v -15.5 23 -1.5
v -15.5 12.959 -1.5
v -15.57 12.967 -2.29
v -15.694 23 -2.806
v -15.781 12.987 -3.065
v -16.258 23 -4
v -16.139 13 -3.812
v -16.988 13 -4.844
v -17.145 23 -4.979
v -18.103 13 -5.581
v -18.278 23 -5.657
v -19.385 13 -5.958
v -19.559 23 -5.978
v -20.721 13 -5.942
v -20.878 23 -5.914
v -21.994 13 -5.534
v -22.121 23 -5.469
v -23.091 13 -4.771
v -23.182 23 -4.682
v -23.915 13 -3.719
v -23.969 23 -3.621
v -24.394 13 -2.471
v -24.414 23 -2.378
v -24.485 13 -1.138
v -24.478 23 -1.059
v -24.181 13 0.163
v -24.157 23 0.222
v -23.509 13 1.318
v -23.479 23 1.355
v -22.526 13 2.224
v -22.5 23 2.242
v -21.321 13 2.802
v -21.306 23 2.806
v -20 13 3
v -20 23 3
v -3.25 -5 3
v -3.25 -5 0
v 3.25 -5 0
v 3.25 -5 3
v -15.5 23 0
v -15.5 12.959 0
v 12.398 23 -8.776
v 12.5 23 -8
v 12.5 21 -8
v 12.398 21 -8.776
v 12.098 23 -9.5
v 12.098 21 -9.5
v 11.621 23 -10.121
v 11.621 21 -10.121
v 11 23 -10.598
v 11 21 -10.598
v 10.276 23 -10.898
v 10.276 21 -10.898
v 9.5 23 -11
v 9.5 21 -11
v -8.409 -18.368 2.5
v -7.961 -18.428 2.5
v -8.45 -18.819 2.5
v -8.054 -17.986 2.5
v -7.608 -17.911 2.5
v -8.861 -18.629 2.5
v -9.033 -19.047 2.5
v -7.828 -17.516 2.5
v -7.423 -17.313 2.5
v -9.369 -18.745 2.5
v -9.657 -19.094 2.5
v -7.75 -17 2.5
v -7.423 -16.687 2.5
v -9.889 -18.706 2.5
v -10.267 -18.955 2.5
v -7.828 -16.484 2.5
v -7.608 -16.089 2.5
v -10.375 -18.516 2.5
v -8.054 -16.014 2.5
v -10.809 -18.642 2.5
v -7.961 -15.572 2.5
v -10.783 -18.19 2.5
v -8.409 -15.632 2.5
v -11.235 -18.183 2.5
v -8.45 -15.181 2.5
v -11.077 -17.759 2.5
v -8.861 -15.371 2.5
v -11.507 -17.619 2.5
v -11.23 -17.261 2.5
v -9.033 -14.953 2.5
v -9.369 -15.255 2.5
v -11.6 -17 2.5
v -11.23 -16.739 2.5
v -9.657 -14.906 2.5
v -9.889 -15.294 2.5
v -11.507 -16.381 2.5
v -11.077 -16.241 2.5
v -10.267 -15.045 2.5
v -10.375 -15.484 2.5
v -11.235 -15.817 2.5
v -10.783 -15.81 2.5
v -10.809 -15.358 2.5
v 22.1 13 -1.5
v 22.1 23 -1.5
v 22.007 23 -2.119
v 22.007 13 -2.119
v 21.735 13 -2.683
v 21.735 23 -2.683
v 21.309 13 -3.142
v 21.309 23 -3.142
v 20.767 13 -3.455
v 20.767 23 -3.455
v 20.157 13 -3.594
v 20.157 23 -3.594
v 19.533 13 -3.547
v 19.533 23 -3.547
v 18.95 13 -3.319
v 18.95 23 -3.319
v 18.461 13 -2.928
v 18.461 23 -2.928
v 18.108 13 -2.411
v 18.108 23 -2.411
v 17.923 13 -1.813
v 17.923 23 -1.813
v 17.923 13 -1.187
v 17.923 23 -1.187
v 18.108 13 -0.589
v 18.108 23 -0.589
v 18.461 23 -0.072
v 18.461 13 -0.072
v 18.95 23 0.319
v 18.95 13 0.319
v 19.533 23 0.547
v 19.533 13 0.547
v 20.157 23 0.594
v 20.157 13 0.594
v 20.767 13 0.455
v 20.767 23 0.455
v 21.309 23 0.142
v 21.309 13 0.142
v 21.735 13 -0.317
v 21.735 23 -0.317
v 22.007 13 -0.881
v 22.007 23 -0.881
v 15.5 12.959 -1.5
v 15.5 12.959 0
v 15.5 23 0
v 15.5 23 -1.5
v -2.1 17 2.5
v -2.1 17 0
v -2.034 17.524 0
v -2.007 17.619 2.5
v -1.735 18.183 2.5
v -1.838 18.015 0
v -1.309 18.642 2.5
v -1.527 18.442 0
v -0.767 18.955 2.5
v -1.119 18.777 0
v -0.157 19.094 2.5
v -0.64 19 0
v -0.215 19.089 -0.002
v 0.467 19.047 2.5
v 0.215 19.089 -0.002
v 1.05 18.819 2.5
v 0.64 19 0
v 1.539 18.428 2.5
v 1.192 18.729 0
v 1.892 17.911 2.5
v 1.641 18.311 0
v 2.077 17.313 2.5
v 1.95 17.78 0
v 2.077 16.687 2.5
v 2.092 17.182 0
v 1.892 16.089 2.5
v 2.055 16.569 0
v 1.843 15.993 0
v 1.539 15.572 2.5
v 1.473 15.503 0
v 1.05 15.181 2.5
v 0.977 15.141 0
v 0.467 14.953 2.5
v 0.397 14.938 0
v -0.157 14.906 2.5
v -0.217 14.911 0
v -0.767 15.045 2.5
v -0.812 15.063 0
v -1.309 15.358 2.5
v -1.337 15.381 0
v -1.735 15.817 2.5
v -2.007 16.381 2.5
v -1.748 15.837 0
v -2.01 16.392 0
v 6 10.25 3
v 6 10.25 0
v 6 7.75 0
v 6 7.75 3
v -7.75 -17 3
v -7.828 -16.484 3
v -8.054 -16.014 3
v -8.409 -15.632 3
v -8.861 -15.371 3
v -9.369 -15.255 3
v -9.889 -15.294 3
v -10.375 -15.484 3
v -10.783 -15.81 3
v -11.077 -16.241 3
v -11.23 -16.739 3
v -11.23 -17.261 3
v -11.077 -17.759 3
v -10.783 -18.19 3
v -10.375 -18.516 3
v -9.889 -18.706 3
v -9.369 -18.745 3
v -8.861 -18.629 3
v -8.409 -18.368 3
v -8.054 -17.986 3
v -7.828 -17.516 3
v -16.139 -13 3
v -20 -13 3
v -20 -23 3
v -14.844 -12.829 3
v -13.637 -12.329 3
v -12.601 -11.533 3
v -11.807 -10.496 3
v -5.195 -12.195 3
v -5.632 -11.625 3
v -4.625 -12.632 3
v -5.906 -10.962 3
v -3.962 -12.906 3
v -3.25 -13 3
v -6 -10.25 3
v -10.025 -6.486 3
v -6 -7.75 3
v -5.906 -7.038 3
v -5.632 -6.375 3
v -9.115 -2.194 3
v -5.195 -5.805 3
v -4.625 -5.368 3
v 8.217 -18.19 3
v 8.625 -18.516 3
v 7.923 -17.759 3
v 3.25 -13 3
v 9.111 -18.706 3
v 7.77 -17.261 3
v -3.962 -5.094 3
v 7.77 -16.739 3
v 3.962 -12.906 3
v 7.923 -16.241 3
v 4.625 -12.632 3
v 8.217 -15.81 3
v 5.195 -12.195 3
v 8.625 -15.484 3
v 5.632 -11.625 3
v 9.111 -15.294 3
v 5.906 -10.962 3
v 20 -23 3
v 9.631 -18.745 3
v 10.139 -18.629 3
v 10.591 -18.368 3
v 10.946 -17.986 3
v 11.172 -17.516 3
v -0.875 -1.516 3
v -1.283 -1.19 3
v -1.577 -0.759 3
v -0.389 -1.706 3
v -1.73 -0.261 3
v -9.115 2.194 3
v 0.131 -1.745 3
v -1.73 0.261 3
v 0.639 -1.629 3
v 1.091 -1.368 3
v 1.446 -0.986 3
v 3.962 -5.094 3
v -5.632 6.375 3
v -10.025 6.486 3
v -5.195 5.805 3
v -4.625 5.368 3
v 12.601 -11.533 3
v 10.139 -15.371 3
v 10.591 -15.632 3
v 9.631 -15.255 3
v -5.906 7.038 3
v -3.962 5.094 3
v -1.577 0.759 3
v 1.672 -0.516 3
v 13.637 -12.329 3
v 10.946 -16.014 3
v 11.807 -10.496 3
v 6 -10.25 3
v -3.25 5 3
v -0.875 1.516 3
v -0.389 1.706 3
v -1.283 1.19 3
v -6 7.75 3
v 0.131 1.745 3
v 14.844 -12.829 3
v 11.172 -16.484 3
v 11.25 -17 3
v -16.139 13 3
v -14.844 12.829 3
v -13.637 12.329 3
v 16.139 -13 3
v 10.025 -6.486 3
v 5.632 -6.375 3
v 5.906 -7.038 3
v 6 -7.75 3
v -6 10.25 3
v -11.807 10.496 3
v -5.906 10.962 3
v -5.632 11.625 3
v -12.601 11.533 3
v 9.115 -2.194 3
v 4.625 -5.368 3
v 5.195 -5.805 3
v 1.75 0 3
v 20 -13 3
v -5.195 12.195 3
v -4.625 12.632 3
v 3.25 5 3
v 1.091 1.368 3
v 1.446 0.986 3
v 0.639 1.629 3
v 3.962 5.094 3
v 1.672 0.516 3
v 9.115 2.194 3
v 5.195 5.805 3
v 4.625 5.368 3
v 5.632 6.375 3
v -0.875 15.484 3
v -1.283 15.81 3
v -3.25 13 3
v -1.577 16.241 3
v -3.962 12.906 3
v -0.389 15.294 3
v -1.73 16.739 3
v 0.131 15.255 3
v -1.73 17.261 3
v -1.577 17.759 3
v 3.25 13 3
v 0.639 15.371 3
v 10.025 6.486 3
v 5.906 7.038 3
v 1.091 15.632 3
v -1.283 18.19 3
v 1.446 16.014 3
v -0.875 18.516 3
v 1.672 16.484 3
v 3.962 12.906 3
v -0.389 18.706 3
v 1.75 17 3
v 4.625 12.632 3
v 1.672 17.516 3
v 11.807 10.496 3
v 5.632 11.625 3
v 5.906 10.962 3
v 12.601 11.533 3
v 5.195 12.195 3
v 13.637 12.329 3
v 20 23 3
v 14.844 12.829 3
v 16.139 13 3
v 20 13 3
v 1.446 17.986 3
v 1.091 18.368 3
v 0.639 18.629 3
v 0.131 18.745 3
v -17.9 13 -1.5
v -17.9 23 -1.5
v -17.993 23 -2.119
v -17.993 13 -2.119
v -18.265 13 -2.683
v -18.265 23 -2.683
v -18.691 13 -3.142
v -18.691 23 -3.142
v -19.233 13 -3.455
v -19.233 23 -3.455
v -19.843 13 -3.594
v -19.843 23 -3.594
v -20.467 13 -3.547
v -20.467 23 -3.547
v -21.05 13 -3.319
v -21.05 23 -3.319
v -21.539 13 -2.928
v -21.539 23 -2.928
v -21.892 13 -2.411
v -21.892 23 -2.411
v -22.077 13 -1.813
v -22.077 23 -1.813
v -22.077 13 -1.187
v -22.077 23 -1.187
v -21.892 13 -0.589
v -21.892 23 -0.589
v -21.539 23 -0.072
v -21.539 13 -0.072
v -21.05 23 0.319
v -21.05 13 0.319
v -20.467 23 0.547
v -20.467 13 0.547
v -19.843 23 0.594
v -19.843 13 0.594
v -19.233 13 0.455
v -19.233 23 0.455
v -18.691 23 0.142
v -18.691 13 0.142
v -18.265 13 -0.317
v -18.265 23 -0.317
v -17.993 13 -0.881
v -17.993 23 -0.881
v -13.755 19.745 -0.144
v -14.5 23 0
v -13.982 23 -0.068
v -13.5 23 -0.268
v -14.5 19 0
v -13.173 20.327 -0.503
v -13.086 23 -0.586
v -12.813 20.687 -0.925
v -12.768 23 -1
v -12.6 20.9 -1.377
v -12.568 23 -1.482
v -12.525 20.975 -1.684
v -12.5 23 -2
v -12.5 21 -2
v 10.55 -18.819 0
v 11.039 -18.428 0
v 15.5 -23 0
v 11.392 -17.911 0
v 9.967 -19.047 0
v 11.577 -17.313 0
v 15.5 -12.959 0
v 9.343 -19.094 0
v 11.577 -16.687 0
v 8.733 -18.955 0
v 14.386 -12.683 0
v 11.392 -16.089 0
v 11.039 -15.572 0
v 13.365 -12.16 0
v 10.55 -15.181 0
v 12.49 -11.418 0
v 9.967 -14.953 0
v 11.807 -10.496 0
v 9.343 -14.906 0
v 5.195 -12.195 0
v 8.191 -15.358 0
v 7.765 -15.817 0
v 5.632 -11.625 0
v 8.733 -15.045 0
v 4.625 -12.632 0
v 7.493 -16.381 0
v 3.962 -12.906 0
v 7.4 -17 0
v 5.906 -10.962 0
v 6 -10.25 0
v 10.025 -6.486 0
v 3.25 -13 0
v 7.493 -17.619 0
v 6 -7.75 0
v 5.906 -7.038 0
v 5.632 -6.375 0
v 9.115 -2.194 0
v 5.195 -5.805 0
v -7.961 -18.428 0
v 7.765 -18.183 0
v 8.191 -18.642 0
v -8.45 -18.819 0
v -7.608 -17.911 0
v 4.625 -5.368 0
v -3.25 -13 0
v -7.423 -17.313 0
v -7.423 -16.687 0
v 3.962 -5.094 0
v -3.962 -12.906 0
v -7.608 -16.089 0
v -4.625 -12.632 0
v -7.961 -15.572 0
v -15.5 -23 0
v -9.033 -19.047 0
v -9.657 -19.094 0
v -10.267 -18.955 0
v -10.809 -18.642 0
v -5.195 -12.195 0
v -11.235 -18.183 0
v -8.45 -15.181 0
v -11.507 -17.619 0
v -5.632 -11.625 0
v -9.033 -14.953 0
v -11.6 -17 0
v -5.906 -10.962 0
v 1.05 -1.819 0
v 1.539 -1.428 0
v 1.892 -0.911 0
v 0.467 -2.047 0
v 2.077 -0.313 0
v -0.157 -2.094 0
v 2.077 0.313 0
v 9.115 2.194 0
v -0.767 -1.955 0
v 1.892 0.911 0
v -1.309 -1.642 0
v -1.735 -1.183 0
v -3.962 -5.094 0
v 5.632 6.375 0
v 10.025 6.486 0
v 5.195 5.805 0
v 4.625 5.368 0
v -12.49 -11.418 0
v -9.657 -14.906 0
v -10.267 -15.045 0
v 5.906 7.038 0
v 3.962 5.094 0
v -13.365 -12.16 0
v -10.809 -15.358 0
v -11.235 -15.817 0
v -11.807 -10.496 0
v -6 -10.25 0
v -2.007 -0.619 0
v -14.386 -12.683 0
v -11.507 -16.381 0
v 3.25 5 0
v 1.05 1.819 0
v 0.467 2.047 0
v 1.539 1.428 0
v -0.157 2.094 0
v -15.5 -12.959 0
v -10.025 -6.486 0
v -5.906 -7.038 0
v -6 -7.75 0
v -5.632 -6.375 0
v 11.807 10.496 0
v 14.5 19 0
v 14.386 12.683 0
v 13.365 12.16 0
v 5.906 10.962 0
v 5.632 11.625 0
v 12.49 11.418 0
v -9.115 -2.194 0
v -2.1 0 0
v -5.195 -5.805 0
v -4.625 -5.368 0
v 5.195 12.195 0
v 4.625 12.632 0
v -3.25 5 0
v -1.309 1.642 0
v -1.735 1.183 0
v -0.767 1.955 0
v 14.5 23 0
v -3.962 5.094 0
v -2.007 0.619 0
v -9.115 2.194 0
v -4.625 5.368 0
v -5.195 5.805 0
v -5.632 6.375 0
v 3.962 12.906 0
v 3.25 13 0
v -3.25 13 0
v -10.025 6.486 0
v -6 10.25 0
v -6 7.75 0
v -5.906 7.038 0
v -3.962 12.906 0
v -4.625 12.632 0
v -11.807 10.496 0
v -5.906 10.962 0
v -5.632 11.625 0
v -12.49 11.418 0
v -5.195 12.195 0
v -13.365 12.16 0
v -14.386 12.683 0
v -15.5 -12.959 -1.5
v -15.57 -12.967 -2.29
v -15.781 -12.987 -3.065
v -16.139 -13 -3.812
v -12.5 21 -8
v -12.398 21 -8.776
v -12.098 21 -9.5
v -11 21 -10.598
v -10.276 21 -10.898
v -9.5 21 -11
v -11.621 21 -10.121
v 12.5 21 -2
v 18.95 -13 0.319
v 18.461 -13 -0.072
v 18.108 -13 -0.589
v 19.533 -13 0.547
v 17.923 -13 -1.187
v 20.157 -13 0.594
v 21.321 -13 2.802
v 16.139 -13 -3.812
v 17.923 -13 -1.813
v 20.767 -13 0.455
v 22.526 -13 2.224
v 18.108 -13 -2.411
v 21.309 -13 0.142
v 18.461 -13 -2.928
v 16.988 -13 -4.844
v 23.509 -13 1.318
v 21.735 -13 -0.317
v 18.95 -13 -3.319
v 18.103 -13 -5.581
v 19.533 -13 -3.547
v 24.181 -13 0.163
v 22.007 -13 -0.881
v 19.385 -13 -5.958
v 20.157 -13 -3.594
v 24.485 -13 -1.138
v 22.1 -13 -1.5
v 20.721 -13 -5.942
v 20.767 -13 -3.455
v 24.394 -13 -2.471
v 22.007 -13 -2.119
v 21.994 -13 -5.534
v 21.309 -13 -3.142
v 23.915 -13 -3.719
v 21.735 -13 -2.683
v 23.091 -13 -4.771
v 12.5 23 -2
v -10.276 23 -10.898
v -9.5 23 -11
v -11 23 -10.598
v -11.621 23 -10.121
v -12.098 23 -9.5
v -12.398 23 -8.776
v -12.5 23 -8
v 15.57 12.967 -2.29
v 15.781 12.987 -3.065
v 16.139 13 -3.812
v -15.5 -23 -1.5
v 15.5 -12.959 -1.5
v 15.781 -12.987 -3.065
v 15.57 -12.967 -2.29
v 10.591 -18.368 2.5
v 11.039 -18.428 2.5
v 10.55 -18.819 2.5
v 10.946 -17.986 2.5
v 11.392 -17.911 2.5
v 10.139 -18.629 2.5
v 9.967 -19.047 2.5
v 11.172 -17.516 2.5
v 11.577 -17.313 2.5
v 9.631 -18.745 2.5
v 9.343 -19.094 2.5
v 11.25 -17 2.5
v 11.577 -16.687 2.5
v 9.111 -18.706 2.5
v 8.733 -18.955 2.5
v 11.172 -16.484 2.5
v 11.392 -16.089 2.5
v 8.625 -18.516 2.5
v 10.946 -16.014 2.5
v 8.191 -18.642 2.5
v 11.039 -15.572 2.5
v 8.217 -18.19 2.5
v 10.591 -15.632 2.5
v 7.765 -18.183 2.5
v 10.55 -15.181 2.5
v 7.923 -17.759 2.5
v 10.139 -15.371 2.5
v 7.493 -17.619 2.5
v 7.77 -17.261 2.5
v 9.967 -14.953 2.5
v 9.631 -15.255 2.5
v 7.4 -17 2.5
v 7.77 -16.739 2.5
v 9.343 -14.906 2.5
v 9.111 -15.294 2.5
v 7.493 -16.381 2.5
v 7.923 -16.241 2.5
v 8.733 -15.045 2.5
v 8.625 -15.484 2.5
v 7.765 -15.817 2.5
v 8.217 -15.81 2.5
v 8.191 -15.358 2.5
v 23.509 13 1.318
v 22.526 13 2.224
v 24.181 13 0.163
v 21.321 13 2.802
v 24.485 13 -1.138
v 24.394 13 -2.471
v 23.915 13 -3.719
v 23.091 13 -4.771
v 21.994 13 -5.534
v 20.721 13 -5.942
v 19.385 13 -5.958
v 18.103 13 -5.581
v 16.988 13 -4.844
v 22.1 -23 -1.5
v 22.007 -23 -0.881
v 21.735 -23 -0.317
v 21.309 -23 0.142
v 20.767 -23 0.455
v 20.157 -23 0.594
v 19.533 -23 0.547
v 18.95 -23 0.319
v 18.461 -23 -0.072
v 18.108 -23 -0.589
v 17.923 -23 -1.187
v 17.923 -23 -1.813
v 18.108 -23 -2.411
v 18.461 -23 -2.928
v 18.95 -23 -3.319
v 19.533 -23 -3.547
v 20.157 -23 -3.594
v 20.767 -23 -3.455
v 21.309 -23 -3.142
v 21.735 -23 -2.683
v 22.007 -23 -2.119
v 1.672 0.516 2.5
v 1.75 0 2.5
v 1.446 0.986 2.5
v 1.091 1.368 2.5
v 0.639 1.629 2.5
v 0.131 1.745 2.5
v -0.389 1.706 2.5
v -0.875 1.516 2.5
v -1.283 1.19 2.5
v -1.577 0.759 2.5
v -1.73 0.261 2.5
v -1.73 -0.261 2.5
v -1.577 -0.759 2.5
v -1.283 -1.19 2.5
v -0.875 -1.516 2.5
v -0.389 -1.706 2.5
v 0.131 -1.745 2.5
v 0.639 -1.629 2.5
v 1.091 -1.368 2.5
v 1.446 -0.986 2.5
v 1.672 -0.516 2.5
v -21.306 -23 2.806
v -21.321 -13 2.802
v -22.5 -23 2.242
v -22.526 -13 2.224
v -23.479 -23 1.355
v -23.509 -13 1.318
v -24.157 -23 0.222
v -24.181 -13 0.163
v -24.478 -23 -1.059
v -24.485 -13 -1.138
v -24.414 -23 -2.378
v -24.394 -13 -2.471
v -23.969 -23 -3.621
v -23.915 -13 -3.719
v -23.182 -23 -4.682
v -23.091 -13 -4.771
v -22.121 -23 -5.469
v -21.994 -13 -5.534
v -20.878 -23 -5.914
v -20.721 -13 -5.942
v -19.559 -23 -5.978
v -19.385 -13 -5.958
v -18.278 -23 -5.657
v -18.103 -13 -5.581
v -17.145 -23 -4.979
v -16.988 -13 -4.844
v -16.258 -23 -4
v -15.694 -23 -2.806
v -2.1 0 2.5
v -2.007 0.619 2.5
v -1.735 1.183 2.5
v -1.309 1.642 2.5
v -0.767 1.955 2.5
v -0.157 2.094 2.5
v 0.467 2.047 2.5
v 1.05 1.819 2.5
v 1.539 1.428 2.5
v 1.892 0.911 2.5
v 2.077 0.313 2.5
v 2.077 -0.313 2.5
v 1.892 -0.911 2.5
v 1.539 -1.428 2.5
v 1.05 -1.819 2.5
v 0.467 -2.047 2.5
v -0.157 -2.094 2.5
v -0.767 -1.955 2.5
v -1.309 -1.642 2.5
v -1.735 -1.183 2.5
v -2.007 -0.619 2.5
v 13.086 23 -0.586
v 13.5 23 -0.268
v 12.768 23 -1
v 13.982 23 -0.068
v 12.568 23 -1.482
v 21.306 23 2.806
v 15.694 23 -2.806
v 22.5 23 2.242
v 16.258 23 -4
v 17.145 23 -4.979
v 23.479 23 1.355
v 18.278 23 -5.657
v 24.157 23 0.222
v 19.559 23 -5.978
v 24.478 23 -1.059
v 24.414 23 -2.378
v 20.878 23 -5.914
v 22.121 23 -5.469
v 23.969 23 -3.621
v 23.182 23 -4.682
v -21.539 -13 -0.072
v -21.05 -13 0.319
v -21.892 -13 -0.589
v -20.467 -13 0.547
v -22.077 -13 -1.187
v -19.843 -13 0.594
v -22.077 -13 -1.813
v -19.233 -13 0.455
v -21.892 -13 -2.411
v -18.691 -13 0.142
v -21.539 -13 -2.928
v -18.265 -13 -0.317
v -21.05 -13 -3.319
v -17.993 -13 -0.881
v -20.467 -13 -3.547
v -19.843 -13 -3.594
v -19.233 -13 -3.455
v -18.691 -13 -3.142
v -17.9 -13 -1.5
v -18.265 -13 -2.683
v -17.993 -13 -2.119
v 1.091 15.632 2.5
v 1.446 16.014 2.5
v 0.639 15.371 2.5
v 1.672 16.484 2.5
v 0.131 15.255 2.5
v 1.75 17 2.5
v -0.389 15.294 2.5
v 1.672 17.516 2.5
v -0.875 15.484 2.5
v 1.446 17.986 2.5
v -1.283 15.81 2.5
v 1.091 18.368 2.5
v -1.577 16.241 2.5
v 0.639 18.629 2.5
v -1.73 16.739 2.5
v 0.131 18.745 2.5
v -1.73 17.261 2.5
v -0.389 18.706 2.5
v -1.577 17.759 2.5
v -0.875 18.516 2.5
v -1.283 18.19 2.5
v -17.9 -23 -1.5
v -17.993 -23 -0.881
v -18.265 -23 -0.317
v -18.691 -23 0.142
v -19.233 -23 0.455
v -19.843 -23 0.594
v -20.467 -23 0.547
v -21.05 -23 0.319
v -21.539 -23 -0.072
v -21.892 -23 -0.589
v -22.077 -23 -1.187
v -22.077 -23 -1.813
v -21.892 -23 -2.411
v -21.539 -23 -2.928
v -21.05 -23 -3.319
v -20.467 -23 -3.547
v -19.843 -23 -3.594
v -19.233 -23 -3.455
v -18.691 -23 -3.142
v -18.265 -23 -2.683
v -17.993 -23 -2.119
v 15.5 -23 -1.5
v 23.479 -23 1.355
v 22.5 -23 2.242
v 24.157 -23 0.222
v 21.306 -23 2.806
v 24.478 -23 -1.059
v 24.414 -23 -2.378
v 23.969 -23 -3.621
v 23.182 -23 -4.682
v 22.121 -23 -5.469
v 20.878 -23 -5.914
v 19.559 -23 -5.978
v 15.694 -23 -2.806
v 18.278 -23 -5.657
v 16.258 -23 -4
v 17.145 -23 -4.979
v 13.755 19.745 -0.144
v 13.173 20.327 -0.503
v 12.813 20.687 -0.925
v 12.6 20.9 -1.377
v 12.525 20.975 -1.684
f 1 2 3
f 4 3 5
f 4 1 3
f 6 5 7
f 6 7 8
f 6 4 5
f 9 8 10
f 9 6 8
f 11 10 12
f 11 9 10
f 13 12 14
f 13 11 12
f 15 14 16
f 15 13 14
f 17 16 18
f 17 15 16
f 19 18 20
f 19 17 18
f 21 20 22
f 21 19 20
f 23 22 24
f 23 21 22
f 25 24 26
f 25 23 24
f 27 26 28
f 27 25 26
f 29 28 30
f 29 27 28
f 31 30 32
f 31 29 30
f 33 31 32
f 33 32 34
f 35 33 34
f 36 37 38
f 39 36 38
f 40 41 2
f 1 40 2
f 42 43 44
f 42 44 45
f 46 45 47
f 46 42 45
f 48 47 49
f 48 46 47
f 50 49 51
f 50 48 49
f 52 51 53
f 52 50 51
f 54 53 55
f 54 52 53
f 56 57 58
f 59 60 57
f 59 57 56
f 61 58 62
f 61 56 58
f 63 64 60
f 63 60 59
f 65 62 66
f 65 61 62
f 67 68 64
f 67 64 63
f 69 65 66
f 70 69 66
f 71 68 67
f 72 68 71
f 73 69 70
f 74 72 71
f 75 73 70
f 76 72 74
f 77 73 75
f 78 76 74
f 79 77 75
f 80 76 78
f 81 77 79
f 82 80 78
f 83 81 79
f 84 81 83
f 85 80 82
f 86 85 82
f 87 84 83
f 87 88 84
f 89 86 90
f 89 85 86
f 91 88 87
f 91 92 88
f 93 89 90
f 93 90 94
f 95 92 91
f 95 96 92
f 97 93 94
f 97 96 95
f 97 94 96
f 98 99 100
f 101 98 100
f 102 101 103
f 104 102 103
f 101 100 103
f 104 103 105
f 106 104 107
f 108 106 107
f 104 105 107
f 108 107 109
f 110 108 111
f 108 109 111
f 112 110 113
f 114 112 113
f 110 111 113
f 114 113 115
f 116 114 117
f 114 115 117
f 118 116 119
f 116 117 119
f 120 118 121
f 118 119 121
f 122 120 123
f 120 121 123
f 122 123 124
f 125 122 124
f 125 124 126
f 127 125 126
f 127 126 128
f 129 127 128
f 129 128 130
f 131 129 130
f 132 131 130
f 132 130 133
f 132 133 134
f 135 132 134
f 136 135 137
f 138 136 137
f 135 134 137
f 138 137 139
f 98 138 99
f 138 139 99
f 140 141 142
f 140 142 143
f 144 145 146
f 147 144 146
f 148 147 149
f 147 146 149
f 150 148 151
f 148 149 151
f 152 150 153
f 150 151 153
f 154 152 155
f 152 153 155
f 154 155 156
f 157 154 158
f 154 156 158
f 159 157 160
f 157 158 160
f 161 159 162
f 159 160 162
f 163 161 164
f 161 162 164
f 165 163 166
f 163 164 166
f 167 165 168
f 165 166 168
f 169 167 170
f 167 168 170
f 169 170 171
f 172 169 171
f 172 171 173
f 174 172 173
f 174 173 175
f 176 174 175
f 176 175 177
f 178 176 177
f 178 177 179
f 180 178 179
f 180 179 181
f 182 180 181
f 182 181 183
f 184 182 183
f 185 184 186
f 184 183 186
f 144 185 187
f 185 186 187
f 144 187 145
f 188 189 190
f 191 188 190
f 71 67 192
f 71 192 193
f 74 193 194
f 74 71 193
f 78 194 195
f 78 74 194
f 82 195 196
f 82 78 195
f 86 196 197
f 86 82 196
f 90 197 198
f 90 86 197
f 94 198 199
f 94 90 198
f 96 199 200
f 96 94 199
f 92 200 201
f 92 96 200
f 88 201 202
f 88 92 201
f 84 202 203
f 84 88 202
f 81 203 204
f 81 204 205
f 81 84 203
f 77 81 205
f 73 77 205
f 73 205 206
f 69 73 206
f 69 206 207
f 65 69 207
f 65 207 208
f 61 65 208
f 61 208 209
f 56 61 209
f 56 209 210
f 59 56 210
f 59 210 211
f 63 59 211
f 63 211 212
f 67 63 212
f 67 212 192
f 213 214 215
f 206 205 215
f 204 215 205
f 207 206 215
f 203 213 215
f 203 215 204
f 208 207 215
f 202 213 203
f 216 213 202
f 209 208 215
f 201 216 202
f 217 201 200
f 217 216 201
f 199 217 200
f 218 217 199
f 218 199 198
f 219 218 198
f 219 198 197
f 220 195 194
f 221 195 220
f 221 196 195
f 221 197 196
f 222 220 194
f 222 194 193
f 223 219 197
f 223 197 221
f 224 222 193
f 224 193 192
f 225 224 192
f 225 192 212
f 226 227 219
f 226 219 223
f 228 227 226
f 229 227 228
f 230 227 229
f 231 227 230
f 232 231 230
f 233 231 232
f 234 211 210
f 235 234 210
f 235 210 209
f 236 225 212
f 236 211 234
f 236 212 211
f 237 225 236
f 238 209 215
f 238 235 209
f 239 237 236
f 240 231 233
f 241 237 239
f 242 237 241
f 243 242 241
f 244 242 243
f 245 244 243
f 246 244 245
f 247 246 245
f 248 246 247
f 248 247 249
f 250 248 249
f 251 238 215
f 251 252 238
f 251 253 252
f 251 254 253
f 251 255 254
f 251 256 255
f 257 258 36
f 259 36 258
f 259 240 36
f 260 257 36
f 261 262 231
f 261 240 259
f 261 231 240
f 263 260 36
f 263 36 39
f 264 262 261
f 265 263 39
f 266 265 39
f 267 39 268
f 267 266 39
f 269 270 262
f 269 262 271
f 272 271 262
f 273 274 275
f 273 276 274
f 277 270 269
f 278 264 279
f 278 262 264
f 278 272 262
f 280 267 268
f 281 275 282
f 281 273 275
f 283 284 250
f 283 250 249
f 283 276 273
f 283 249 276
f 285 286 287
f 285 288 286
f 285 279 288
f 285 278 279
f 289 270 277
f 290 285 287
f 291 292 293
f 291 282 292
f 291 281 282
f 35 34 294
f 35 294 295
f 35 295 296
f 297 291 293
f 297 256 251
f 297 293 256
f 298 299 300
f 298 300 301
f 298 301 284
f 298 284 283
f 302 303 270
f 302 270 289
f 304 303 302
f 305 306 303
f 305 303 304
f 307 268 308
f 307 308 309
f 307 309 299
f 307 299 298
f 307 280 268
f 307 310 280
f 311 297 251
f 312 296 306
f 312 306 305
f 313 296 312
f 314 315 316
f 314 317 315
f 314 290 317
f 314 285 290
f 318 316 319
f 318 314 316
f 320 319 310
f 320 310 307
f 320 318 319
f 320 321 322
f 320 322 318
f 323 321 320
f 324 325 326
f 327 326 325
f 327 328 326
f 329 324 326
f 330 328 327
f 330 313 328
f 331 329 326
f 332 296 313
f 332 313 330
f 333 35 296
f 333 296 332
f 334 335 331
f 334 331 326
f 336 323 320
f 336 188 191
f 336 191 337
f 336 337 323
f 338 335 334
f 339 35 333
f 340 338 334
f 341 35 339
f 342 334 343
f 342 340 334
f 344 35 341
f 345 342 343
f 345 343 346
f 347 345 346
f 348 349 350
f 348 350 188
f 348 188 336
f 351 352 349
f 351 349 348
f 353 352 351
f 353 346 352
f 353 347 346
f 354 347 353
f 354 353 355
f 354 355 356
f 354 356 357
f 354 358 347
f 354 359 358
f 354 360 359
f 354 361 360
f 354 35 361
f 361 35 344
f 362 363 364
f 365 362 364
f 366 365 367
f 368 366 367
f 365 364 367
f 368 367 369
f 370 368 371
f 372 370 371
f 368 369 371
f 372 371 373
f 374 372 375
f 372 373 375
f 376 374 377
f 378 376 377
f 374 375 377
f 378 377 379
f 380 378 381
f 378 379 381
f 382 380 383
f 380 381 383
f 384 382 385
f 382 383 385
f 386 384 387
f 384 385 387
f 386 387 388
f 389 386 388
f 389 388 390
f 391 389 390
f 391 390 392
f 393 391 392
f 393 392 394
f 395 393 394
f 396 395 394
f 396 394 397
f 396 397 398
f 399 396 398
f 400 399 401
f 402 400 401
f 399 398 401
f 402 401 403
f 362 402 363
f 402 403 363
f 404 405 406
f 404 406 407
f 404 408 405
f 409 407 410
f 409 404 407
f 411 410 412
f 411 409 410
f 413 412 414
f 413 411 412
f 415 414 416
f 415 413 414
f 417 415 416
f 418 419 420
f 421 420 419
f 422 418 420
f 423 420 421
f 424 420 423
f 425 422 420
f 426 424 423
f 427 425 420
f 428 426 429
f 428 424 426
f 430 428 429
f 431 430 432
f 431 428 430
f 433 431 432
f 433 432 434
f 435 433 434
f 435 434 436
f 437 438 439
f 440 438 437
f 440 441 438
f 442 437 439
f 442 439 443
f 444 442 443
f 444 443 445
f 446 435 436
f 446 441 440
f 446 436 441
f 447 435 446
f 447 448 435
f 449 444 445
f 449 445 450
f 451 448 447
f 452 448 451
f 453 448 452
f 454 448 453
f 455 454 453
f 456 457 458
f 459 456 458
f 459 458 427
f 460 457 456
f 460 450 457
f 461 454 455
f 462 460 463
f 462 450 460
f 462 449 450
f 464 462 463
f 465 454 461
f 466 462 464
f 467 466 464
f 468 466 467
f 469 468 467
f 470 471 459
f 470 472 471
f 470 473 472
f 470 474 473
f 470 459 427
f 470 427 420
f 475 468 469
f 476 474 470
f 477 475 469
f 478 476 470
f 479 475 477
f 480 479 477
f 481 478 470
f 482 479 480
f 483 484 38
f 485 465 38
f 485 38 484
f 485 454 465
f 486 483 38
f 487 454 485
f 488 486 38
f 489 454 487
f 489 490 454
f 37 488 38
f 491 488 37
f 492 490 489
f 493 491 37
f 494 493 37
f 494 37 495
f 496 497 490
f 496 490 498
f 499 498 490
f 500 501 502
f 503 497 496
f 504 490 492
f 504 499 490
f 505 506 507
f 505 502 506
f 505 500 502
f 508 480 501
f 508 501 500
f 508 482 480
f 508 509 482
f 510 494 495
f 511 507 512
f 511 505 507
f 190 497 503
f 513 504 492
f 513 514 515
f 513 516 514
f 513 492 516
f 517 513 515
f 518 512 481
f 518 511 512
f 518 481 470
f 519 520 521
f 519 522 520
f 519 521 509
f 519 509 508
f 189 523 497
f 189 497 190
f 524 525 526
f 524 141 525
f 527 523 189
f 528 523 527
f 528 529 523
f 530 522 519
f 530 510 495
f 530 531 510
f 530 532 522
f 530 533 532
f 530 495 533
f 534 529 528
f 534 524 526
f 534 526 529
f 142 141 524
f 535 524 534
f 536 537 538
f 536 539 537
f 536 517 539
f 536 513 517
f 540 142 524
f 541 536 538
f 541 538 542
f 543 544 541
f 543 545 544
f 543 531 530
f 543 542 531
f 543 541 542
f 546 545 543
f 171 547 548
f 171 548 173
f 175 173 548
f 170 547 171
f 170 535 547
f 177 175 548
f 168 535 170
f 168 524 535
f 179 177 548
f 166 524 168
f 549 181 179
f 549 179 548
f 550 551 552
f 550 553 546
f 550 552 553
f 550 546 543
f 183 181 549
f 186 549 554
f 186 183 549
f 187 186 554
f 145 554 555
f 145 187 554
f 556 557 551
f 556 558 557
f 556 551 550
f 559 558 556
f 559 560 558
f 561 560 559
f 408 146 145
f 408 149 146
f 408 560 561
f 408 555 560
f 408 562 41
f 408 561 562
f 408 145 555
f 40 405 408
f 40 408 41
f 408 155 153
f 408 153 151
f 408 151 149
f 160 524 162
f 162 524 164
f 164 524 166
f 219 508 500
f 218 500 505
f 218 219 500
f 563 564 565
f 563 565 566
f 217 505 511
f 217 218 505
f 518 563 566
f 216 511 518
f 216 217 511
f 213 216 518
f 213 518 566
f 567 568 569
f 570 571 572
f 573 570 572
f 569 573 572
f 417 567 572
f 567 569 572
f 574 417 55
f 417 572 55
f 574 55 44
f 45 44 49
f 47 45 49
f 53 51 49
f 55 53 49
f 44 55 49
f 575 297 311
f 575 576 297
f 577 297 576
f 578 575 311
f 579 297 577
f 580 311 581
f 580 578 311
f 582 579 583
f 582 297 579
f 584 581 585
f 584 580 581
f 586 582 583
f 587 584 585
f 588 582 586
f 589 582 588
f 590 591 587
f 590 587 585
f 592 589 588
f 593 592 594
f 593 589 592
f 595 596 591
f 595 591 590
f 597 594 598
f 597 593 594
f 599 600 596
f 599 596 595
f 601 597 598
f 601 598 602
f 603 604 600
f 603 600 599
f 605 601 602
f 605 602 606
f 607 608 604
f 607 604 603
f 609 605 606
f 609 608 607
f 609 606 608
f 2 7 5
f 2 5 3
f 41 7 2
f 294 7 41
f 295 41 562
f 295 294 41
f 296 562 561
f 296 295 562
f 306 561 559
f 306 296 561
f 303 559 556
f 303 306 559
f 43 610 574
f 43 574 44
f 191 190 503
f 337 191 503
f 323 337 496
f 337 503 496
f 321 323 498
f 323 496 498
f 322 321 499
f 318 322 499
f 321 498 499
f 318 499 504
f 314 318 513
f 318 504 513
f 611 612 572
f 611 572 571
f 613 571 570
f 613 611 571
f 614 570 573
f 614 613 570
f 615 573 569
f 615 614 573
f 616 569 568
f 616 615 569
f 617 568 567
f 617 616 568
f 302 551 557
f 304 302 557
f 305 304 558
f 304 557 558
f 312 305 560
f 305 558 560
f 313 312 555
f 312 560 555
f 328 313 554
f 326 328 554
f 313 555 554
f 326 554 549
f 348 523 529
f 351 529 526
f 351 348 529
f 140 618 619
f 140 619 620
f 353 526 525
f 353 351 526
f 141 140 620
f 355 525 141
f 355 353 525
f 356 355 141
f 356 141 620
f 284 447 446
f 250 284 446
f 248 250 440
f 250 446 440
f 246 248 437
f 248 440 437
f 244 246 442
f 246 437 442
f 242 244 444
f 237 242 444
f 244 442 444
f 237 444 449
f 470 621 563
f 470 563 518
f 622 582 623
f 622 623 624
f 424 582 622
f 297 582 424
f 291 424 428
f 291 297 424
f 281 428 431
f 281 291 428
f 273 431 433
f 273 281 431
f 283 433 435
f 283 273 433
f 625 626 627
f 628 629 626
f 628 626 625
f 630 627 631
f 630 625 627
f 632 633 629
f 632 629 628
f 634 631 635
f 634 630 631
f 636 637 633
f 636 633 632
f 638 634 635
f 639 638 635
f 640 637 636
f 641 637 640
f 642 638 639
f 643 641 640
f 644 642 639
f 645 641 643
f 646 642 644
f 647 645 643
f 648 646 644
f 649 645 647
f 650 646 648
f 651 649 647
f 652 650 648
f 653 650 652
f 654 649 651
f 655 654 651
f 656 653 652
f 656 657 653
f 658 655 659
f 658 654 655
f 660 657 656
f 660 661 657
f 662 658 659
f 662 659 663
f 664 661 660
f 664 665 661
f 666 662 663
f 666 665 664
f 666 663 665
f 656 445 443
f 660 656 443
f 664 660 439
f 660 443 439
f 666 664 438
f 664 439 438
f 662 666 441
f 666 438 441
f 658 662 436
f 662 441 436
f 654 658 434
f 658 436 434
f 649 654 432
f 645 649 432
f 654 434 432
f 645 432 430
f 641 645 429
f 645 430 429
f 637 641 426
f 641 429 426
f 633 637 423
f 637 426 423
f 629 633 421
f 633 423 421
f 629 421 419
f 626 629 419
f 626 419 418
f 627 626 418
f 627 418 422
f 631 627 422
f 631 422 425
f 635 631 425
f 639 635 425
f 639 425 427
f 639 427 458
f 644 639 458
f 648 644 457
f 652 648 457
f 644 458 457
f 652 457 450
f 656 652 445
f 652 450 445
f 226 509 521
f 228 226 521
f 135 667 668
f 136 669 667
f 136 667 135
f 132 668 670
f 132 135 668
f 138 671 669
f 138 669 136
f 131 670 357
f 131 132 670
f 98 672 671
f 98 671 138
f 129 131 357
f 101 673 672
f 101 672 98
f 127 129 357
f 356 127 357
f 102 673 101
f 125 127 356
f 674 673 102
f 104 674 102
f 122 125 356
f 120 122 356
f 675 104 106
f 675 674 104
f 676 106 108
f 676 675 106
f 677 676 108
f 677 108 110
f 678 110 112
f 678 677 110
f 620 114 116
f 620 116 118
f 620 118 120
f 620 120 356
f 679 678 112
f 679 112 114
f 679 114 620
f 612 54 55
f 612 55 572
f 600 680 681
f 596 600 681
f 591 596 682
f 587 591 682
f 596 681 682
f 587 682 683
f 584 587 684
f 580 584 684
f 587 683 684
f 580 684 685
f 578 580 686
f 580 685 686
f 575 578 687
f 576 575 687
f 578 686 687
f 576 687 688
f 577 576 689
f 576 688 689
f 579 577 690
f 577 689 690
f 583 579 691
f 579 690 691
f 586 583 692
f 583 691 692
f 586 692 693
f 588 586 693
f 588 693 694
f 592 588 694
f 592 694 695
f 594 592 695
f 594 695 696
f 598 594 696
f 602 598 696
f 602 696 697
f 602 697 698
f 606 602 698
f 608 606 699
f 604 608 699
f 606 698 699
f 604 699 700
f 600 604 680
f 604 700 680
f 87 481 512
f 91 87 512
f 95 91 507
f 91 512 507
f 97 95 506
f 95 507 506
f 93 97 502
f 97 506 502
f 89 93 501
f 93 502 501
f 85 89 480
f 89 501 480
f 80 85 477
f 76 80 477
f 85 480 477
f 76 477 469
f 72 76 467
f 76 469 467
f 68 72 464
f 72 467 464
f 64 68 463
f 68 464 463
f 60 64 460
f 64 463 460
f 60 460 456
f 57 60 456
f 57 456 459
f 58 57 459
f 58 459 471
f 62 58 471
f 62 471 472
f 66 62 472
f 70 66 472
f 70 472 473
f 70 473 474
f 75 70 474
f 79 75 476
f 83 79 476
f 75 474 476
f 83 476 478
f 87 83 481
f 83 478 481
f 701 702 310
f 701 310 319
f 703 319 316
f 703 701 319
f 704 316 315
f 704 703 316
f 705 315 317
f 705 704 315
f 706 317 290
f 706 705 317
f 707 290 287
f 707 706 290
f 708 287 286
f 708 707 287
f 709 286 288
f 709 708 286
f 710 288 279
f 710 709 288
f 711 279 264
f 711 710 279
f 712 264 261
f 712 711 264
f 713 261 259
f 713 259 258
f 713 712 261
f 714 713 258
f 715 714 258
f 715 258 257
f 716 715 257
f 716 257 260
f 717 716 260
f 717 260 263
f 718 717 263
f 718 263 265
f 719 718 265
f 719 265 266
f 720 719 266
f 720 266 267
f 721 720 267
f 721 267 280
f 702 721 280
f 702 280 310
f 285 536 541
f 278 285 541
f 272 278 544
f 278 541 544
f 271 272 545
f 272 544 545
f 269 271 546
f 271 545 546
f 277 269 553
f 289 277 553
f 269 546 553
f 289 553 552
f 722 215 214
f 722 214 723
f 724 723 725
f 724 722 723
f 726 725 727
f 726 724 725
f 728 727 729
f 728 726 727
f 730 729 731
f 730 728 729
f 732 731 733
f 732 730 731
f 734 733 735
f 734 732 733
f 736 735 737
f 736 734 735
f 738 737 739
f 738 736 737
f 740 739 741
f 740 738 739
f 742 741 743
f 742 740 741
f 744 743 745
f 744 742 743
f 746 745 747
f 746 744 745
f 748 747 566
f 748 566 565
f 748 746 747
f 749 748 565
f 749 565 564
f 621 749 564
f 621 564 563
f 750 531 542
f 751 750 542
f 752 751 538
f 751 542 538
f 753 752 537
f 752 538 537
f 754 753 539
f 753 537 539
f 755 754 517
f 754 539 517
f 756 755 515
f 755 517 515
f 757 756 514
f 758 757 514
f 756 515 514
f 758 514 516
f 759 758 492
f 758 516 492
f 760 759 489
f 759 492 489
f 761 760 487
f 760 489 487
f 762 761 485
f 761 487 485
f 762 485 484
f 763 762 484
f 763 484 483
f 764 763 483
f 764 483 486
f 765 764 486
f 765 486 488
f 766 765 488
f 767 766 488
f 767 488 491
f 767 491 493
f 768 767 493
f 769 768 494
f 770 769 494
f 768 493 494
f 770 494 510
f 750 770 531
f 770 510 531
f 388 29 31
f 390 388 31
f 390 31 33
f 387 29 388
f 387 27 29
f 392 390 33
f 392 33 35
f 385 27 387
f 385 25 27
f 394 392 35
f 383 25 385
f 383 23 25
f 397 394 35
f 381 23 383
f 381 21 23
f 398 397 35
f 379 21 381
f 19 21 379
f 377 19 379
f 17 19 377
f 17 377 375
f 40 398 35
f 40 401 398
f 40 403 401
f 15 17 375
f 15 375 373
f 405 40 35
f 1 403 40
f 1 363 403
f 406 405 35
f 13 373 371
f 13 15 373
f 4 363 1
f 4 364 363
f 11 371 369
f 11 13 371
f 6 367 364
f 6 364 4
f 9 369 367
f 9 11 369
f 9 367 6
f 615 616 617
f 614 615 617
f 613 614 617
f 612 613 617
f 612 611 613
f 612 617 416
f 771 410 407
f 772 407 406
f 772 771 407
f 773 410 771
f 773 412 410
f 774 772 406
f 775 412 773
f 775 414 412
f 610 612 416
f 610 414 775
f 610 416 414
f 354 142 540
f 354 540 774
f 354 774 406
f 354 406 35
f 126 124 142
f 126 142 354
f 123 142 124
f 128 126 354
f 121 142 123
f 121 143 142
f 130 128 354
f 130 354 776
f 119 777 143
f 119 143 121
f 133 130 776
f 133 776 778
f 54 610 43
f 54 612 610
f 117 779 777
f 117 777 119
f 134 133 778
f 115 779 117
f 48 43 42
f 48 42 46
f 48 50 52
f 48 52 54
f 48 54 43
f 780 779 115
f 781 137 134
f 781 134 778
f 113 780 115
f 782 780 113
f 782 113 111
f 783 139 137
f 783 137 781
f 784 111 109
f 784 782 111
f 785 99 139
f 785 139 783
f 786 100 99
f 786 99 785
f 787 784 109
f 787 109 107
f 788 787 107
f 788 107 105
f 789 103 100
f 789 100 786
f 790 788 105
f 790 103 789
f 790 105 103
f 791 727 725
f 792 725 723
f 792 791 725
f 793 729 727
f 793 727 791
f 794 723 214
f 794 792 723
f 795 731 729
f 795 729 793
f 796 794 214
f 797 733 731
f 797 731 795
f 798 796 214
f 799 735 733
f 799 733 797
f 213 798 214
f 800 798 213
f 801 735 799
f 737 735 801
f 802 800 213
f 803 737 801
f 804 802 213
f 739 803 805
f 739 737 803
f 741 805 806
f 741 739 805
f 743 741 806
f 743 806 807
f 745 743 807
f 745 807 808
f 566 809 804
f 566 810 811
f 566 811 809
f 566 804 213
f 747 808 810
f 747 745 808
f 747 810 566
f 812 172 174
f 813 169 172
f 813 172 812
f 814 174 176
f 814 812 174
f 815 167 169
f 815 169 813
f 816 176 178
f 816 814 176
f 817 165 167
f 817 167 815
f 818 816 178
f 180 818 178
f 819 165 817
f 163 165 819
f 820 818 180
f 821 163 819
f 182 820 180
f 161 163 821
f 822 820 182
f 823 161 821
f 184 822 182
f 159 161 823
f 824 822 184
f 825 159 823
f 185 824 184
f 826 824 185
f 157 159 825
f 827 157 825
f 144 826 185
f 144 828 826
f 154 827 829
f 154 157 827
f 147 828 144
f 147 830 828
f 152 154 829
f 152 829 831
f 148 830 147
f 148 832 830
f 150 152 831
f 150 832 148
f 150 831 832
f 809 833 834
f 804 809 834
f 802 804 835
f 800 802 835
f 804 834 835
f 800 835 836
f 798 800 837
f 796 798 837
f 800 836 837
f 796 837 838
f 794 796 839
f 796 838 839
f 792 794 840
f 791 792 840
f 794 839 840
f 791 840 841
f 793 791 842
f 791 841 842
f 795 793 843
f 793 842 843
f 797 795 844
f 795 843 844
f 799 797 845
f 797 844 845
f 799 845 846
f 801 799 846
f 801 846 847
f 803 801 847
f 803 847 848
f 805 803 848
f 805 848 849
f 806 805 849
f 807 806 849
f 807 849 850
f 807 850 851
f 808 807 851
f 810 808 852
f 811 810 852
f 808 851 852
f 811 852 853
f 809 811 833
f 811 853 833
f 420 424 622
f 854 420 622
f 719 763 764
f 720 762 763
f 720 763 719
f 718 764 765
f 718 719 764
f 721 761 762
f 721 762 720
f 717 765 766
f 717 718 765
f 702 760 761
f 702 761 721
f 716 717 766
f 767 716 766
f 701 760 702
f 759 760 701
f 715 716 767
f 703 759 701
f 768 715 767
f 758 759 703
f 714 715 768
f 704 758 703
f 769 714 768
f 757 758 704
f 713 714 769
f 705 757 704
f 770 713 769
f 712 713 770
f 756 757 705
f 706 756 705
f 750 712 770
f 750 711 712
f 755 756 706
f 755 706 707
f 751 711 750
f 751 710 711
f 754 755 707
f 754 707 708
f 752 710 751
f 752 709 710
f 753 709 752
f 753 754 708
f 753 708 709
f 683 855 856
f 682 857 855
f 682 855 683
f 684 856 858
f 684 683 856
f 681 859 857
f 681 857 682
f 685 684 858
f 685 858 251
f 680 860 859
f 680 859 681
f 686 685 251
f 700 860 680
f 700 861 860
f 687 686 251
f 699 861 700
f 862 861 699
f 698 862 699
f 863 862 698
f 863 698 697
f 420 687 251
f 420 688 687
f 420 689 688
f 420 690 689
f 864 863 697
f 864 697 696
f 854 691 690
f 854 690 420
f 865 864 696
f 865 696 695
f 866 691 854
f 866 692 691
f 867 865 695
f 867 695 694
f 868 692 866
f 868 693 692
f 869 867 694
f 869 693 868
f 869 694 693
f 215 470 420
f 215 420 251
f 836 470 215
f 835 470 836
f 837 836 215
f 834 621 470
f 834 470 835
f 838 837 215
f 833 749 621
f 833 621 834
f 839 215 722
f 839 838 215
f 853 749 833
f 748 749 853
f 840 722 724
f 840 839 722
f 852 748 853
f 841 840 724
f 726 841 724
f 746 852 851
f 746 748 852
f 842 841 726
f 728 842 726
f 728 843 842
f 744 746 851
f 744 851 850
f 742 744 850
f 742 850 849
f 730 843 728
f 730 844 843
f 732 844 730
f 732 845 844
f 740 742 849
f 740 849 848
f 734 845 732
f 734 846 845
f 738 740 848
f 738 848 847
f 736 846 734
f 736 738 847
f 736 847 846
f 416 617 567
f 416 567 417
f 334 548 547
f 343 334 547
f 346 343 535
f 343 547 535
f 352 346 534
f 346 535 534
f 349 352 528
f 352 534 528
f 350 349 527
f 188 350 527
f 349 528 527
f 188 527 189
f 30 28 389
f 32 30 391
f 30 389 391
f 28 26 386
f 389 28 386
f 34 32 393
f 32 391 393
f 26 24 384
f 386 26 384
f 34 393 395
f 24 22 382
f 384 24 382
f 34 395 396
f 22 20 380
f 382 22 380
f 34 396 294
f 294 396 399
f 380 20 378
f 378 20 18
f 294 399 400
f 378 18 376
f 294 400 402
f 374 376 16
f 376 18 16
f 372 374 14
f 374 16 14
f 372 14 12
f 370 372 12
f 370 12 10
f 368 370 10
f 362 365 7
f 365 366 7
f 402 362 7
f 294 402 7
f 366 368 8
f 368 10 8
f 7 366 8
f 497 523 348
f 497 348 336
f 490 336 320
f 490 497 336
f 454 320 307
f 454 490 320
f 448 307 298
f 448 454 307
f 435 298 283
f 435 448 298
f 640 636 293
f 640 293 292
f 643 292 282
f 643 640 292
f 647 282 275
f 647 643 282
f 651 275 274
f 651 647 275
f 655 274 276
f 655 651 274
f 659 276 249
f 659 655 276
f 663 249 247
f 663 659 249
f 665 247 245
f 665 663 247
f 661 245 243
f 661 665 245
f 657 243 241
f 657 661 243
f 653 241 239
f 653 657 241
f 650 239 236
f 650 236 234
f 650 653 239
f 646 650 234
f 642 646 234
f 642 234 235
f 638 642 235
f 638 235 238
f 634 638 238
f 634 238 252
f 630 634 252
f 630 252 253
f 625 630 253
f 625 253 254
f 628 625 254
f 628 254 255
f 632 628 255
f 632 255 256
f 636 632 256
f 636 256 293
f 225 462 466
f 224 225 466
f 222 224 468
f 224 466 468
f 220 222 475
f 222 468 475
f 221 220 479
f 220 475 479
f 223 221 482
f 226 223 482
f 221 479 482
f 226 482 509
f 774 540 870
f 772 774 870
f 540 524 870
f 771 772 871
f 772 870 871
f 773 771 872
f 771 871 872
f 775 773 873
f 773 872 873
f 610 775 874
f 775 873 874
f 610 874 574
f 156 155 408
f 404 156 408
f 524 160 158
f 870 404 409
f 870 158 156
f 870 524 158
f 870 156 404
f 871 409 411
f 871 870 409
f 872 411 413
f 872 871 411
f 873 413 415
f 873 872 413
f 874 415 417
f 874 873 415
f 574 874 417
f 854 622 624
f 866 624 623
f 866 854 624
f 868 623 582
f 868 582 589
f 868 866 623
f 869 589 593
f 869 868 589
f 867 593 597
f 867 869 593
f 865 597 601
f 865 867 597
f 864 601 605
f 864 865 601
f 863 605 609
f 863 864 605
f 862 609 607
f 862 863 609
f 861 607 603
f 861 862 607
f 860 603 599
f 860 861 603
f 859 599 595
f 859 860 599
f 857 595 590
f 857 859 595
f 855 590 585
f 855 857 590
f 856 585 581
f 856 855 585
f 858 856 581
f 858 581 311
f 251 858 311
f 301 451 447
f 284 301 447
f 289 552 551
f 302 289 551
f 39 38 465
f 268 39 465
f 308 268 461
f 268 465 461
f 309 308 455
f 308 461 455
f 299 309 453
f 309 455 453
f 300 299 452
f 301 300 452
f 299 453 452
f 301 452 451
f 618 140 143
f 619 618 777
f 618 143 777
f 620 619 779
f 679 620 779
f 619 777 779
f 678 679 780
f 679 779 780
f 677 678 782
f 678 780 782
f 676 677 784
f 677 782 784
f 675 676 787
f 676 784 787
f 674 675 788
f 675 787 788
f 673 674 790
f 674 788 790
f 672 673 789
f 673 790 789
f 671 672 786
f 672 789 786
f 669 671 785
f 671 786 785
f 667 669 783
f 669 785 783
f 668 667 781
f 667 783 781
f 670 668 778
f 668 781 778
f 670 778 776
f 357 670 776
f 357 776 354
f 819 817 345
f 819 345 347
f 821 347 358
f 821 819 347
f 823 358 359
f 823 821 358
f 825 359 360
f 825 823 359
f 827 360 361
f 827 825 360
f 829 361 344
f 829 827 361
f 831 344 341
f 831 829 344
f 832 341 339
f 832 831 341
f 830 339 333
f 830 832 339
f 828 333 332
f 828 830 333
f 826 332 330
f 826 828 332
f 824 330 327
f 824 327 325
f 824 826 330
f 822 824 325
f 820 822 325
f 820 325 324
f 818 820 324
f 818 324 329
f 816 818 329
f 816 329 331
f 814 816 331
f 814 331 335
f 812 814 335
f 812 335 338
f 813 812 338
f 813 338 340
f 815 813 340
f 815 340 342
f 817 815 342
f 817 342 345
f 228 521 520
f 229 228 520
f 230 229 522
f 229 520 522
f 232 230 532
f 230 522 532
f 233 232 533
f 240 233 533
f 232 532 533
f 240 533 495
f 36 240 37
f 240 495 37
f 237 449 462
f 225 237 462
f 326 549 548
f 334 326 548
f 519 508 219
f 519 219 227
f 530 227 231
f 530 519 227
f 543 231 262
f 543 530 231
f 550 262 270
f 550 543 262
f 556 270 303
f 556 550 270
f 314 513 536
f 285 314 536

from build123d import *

# Parameters (mm, degrees)
SKETCH1_R               = 1.75
BOSS_EXTRUDE1_DEPTH     = 3
SKETCH2_R               = 2.1
BOSS_EXTRUDE2_DEPTH     = 10
SKETCH3_R               = 2.1
BOSS_EXTRUDE3_DEPTH     = 10
BOSS_EXTRUDE4_DEPTH     = 2
FILLET1_R               = 2
SKETCH6_R               = 2.1
CUT_EXTRUDE1_DEPTH      = 12
CUT_EXTRUDE1_DEPTH_BACK = 2.5
FILLET2_R               = 5


with BuildPart() as part:
    # Sketch1 → Boss-Extrude1 (new body)
    with BuildSketch(Plane.XY):
        with BuildLine():
            Line((-17, 23), (17, 23))
            Line((17, 23), (17, 13))
            Line((17, 13), (13.5, 13))
            ThreePointArc((13.5, 13), (9, 0), (13.5, -13))
            Line((13.5, -13), (17, -13))
            Line((17, -13), (17, -23))
            Line((17, -23), (-17, -23))
            Line((-17, -23), (-17, -13))
            Line((-17, -13), (-13.5, -13))
            ThreePointArc((-13.5, -13), (-9, 0), (-13.5, 13))
            Line((-13.5, 13), (-17, 13))
            Line((-17, 13), (-17, 23))
        make_face()
        Circle(SKETCH1_R, mode=Mode.SUBTRACT)
        with Locations((0, 17)):
            Circle(SKETCH1_R, mode=Mode.SUBTRACT)
        with Locations((-9.5, -17)):
            Circle(SKETCH1_R, mode=Mode.SUBTRACT)
        with Locations((9.5, -17)):
            Circle(SKETCH1_R, mode=Mode.SUBTRACT)
        with BuildLine():
            Line((-3.25, 13), (3.25, 13))
            ThreePointArc((3.25, 13), (5.194543648, 12.194543648), (6, 10.25))
            Line((6, 10.25), (6, 7.75))
            ThreePointArc((6, 7.75), (5.194543648, 5.805456352), (3.25, 5))
            Line((3.25, 5), (-3.25, 5))
            ThreePointArc((-3.25, 5), (-5.194543648, 5.805456352), (-6, 7.75))
            Line((-6, 7.75), (-6, 10.25))
            ThreePointArc((-6, 10.25), (-5.194543648, 12.194543648), (-3.25, 13))
        make_face(mode=Mode.SUBTRACT)
        with BuildLine():
            Line((-3.25, -5), (3.25, -5))
            ThreePointArc((3.25, -5), (5.194543648, -5.805456352), (6, -7.75))
            Line((6, -7.75), (6, -10.25))
            ThreePointArc((6, -10.25), (5.194543648, -12.194543648), (3.25, -13))
            Line((3.25, -13), (-3.25, -13))
            ThreePointArc((-3.25, -13), (-5.194543648, -12.194543648), (-6, -10.25))
            Line((-6, -10.25), (-6, -7.75))
            ThreePointArc((-6, -7.75), (-5.194543648, -5.805456352), (-3.25, -5))
        make_face(mode=Mode.SUBTRACT)
    extrude(amount=BOSS_EXTRUDE1_DEPTH)

    # Sketch2 → Boss-Extrude2 (add)
    with BuildSketch(Plane(origin=(0, 23, 0), x_dir=(1, 0, 0), z_dir=(0, 1, 0))):
        with BuildLine():
            Line((-20, -3), (-15.5, -3))
            Line((-15.5, -3), (-15.5, 1.5))
            ThreePointArc((-15.5, 1.5), (-23.181980515, 4.681980515), (-20, -3))
        make_face()
        with Locations((-20, 1.5)):
            Circle(SKETCH2_R, mode=Mode.SUBTRACT)
        with BuildLine():
            Line((20, -3), (15.5, -3))
            Line((15.5, -3), (15.5, 1.5))
            ThreePointArc((15.5, 1.5), (23.181980515, 4.681980515), (20, -3))
        make_face()
        with Locations((20, 1.5)):
            Circle(SKETCH2_R, mode=Mode.SUBTRACT)
    extrude(amount=-BOSS_EXTRUDE2_DEPTH)

    # Sketch3 → Boss-Extrude3 (add)
    with BuildSketch(Plane.XZ.offset(23)):
        with BuildLine():
            Line((-15.5, 3), (-20, 3))
            ThreePointArc((-20, 3), (-23.181980515, -4.681980515), (-15.5, -1.5))
            Line((-15.5, -1.5), (-15.5, 3))
        make_face()
        with Locations((-20, -1.5)):
            Circle(SKETCH3_R, mode=Mode.SUBTRACT)
        with BuildLine():
            Line((15.5, 3), (15.5, -1.5))
            ThreePointArc((15.5, -1.5), (23.181980515, -4.681980515), (20, 3))
            Line((20, 3), (15.5, 3))
        make_face()
        with Locations((20, -1.5)):
            Circle(SKETCH3_R, mode=Mode.SUBTRACT)
    extrude(amount=-BOSS_EXTRUDE3_DEPTH)

    # Sketch4 → Boss-Extrude4 (add)
    with BuildSketch(Plane(origin=(0, 23, 0), x_dir=(1, 0, 0), z_dir=(0, 1, 0))):
        with BuildLine():
            Line((-12.5, 0), (12.5, 0))
            Line((12.5, 0), (12.5, 8))
            ThreePointArc((12.5, 8), (11.621320344, 10.121320344), (9.5, 11))
            Line((9.5, 11), (-9.5, 11))
            ThreePointArc((-9.5, 11), (-11.621320344, 10.121320344), (-12.5, 8))
            Line((-12.5, 8), (-12.5, 0))
        make_face()
    extrude(amount=-BOSS_EXTRUDE4_DEPTH)

    # Fillet1
    fillet1_edges = [part.edges().sort_by_distance(p)[0] for p in [
        (-12.5, 22, 0),
        (0, 21, 0),
        (12.5, 22, 0),
    ]]
    fillet(fillet1_edges, radius=FILLET1_R)

    # Sketch6 → Cut-Extrude1 (cut, two sides)
    with BuildSketch(Plane(origin=(0, 0, 0), x_dir=(-1, 0, 0), z_dir=(0, 0, -1))) as cut_extrude1_sk:
        Circle(SKETCH6_R)
        with Locations((0, 17)):
            Circle(SKETCH6_R)
        with Locations((-9.5, -17)):
            Circle(SKETCH6_R)
        with Locations((9.5, -17)):
            Circle(SKETCH6_R)
    extrude(amount=CUT_EXTRUDE1_DEPTH, mode=Mode.SUBTRACT)
    extrude(cut_extrude1_sk.sketch, amount=-CUT_EXTRUDE1_DEPTH_BACK, mode=Mode.SUBTRACT)

    # Fillet2
    fillet2_edges = [part.edges().sort_by_distance(p)[0] for p in [
        (-13.5, -13, 1.5),
        (13.5, -13, 1.5),
        (-13.5, 13, 1.5),
        (13.5, 13, 1.5),
    ]]
    fillet(fillet2_edges, radius=FILLET2_R)


solid = part.part
